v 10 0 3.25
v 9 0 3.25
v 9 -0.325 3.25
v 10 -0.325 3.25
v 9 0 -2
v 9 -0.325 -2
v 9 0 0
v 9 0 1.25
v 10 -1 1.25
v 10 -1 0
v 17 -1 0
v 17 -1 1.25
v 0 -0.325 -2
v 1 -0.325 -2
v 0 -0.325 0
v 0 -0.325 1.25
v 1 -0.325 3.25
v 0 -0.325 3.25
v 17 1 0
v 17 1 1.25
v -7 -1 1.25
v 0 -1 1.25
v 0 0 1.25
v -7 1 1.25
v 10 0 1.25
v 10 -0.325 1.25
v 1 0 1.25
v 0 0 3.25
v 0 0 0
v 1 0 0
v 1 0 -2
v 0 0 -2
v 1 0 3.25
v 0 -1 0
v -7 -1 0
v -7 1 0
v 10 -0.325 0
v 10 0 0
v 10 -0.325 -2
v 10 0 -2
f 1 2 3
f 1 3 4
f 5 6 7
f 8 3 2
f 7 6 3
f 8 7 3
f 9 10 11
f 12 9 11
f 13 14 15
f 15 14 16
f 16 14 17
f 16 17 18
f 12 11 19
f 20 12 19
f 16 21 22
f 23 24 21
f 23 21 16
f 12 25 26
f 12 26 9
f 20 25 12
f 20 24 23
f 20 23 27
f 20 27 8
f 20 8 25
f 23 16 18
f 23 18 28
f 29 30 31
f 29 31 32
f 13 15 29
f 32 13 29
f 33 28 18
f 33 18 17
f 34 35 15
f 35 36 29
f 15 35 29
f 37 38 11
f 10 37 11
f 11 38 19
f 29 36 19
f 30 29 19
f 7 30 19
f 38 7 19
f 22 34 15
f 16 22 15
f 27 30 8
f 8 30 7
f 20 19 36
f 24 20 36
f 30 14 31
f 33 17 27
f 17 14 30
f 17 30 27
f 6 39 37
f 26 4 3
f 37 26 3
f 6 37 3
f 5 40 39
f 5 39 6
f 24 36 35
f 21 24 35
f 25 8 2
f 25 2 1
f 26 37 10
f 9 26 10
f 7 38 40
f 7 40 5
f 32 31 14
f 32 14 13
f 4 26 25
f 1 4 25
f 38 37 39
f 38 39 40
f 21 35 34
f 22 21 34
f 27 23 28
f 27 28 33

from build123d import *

# Parameters (mm, degrees)
BOSS_EXTRUDE1_DEPTH = 1.25
SKETCH2_W           = 1
SKETCH2_H           = 0.325
BOSS_EXTRUDE2_DEPTH = 2
SKETCH3_W           = 1
SKETCH3_H           = 0.325
BOSS_EXTRUDE3_DEPTH = 2


with BuildPart() as part:
    # Sketch1 → Boss-Extrude1 (new body)
    with BuildSketch(Plane.XY):
        Polygon((1, 0), (9, 0), (9, -0.325), (10, -0.325), (10, -1), (17, -1), (17, 1), (10, 1), (0, 1), (-7, 1), (-7, -1), (0, -1), (0, -0.325), (1, -0.325), align=None)
    extrude(amount=BOSS_EXTRUDE1_DEPTH)

    # Sketch2 → Boss-Extrude2 (add)
    with BuildSketch(Plane.XY.offset(1.25)):
        with Locations((0.5, -0.1625)):
            Rectangle(SKETCH2_W, SKETCH2_H)
        with Locations((9.5, -0.1625)):
            Rectangle(SKETCH2_W, SKETCH2_H)
    extrude(amount=BOSS_EXTRUDE2_DEPTH)

    # Sketch3 → Boss-Extrude3 (add)
    with BuildSketch(Plane(origin=(0, 0, 0), x_dir=(-1, 0, 0), z_dir=(0, 0, -1))):
        with Locations((-9.5, -0.1625)):
            Rectangle(SKETCH3_W, SKETCH3_H)
        with Locations((-0.5, -0.1625)):
            Rectangle(SKETCH3_W, SKETCH3_H)
    extrude(amount=BOSS_EXTRUDE3_DEPTH)


solid = part.part
